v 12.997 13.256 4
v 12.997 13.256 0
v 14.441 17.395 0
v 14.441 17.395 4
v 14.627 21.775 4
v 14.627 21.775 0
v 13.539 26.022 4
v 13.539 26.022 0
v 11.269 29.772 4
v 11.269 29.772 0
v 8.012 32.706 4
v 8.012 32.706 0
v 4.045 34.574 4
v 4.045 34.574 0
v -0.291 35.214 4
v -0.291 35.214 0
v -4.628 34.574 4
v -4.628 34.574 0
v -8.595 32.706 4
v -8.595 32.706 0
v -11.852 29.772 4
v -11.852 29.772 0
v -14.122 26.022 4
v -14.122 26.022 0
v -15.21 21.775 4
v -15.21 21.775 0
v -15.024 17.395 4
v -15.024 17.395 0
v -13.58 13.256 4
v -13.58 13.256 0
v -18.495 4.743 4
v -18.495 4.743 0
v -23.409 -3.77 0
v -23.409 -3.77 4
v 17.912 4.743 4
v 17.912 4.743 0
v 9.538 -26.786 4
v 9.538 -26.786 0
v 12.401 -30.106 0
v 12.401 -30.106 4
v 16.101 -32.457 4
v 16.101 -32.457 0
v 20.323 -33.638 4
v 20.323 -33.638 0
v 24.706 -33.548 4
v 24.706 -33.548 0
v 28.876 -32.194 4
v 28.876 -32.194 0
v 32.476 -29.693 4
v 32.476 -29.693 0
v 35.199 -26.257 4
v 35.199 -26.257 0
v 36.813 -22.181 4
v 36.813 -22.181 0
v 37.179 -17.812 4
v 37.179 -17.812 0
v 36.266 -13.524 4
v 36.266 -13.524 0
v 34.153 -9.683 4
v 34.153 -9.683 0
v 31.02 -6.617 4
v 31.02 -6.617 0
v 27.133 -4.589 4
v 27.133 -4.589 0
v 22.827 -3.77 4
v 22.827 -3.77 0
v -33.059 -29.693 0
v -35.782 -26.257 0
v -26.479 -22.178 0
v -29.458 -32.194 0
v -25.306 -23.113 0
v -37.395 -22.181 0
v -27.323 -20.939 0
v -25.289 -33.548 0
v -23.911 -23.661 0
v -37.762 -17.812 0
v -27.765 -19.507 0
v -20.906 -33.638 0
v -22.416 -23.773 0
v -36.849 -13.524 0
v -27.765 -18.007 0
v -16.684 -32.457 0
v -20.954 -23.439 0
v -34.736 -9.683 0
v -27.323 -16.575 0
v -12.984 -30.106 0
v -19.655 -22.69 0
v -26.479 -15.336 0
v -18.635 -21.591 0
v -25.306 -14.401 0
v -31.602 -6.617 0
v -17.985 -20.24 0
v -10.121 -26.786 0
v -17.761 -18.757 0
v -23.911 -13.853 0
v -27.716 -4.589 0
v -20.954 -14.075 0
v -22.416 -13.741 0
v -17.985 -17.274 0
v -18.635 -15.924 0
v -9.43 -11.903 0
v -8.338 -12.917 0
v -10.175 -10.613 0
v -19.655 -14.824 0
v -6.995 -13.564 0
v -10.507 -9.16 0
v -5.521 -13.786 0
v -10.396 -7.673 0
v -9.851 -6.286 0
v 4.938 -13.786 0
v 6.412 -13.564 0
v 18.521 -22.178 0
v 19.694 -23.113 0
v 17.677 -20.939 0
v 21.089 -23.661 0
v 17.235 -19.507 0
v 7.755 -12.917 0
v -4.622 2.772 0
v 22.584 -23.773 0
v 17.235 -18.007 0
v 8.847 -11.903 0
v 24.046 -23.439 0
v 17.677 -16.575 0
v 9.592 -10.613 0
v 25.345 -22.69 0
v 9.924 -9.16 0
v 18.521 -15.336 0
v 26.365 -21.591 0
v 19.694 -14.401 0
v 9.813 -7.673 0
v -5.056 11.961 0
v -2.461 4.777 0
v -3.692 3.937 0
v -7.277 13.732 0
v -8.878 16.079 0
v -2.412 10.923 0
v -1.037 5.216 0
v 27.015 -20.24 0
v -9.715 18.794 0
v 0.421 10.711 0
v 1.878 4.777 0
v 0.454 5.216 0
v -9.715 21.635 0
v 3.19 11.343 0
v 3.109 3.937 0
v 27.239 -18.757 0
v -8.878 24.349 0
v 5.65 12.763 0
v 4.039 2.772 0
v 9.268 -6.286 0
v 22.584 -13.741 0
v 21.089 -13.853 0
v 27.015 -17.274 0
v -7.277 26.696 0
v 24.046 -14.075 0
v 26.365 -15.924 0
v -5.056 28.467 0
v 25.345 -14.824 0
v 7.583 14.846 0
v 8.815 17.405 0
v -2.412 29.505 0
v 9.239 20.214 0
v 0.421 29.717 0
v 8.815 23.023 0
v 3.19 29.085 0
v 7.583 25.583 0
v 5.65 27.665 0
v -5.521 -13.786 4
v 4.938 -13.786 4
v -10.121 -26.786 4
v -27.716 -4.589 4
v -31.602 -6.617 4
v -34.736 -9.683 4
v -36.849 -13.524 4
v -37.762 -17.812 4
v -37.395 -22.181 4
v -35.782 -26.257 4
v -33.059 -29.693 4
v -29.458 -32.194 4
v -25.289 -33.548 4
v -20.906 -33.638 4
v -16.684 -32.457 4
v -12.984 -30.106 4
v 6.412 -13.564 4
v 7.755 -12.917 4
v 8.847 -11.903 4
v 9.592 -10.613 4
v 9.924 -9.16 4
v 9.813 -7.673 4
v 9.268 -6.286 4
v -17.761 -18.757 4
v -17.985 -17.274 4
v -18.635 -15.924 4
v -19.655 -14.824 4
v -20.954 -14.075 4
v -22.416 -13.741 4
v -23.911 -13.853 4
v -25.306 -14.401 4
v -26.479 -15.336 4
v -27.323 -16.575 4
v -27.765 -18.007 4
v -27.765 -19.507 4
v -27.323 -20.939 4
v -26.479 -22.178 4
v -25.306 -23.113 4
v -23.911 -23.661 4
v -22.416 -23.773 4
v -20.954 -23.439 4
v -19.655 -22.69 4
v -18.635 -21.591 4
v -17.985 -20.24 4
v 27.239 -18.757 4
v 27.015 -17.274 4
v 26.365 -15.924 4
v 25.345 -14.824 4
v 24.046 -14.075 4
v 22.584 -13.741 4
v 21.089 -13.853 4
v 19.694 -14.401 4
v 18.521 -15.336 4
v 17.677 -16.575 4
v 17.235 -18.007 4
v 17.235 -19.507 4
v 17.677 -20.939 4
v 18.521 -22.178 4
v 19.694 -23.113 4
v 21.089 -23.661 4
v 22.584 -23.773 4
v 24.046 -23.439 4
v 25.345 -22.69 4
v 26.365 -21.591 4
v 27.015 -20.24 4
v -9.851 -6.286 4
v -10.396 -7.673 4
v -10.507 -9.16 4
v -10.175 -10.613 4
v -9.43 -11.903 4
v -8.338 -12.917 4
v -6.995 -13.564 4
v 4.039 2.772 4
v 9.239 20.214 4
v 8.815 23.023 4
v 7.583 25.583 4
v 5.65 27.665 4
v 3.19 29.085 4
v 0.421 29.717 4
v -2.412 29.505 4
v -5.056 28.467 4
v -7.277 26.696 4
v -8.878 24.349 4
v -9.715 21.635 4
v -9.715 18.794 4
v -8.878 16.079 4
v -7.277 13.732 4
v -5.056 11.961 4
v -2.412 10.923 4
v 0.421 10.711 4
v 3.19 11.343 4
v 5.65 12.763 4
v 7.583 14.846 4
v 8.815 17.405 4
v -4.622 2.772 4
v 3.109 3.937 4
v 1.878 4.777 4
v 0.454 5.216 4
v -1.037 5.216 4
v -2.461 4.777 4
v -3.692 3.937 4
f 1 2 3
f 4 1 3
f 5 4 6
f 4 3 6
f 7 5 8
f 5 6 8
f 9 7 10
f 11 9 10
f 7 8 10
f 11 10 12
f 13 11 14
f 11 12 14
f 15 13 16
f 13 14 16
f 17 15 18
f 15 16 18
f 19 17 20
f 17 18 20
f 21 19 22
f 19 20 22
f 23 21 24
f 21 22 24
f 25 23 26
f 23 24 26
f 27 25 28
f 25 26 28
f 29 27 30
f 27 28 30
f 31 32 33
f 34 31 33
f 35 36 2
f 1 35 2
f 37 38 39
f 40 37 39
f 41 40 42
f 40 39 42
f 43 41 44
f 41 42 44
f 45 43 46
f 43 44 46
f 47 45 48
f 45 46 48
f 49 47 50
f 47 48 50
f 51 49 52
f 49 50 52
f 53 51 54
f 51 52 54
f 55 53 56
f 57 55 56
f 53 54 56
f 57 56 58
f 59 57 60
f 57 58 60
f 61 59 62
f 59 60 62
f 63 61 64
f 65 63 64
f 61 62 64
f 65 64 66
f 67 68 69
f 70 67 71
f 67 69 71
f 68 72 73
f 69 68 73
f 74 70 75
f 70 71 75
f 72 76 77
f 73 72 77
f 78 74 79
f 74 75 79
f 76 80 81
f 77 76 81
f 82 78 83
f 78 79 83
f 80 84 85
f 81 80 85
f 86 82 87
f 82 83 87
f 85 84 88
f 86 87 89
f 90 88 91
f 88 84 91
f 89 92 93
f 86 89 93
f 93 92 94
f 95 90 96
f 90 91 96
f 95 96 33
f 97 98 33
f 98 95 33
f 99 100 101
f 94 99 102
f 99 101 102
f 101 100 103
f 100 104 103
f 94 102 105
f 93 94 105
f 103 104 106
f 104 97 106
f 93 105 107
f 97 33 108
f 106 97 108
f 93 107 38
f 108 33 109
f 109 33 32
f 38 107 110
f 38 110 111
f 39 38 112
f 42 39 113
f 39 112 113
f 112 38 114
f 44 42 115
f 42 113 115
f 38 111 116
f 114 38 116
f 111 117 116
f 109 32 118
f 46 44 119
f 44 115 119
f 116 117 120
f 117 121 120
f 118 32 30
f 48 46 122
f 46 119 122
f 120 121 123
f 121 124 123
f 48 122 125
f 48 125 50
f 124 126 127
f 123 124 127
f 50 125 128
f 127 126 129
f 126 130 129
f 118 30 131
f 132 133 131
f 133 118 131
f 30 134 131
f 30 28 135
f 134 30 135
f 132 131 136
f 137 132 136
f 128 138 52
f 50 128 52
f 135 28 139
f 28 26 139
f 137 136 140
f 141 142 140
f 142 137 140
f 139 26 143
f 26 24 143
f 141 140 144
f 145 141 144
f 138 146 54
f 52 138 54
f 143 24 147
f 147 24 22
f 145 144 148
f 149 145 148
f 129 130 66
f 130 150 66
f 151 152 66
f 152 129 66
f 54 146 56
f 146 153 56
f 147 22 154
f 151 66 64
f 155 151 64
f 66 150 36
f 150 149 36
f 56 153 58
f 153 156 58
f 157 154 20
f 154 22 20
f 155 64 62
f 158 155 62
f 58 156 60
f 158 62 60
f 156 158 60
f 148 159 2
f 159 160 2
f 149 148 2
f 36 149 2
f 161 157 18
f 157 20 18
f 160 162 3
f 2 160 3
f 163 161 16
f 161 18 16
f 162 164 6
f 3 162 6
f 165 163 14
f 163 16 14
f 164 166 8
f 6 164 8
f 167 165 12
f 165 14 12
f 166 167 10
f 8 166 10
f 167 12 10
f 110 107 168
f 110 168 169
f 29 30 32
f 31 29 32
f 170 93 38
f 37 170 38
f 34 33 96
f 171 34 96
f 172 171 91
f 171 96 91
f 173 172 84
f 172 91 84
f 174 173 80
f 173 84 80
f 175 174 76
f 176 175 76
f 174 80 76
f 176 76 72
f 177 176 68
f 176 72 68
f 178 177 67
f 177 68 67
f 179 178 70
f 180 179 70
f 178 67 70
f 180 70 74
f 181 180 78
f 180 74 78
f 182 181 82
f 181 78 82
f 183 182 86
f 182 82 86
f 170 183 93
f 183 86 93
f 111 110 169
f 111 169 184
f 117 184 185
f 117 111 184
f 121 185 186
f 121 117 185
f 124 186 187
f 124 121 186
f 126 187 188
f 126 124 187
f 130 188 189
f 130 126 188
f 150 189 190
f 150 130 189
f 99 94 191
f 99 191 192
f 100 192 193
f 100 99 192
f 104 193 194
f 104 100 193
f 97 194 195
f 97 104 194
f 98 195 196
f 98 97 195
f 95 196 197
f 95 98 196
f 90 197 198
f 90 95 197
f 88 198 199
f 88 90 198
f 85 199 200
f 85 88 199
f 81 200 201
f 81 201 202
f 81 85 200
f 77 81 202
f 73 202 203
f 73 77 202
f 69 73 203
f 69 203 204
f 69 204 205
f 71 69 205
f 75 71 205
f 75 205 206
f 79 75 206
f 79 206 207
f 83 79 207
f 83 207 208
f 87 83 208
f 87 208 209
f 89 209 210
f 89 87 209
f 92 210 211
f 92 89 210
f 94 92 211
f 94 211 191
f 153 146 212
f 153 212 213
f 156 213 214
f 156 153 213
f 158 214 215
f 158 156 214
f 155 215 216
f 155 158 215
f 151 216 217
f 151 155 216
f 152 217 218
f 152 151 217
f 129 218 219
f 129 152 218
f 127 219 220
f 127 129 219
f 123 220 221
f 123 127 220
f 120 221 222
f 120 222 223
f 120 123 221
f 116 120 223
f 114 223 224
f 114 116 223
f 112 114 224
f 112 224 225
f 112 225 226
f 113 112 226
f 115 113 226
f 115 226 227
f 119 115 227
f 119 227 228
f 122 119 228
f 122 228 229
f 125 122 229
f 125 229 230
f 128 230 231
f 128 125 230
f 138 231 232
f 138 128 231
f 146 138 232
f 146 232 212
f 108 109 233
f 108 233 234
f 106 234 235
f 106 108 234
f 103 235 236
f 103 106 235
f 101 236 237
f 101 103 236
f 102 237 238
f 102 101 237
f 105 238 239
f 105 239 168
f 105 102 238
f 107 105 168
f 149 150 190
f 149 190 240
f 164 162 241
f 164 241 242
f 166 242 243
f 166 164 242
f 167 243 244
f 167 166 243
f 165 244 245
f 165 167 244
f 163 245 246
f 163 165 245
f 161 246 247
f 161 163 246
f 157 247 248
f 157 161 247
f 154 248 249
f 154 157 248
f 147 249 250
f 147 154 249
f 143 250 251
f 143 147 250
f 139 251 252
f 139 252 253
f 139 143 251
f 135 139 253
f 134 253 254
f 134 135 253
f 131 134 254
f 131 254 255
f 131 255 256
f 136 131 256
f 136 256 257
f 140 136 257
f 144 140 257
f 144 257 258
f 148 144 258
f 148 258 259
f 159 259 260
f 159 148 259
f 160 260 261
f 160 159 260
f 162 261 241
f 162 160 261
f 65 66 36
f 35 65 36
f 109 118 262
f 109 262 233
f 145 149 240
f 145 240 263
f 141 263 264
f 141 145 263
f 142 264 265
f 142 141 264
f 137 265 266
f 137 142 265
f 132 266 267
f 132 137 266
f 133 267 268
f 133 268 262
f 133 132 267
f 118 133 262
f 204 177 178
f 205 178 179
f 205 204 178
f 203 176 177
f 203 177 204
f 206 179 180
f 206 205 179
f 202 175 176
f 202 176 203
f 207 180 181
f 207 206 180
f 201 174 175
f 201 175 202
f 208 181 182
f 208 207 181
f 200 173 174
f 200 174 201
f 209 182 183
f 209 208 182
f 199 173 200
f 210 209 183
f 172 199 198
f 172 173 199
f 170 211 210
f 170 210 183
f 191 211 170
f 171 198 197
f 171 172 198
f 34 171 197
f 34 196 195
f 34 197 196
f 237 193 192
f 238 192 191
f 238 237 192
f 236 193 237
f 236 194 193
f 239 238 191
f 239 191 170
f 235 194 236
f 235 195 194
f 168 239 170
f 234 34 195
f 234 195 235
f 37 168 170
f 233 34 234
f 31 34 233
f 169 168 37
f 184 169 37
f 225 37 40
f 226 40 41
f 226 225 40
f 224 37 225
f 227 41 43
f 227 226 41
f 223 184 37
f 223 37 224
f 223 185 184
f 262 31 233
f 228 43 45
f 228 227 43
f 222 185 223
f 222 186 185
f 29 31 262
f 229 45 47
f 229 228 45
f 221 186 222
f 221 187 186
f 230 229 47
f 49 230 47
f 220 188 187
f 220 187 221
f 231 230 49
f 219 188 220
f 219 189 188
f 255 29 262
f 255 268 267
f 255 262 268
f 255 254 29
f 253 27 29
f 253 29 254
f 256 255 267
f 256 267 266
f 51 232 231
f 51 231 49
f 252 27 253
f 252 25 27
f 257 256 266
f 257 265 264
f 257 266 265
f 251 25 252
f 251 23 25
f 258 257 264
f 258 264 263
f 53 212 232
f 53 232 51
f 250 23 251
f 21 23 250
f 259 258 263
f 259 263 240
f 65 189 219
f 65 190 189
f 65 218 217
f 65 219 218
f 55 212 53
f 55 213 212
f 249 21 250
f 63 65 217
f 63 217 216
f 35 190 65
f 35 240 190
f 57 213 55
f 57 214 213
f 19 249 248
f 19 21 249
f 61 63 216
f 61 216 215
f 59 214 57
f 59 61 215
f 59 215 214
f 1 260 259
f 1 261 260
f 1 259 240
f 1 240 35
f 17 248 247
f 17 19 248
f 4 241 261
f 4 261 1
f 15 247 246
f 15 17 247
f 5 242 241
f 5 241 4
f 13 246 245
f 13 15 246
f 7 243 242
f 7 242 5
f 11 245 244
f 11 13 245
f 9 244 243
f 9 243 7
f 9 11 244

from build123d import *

# Parameters (mm, degrees)
SKETCH_1_R      = 9.53
SKETCH_1_R_2    = 5.03
EXTRUDE_1_DEPTH = 4


with BuildPart() as part:
    # 草图1 → 凸台-拉伸1 (new body)
    with BuildSketch(Plane.XY):
        with BuildLine():
            Line((-18.494622549, 4.742999843), (-23.409453688, -3.769737399))
            ThreePointArc((-23.409453688, -3.769737399), (-35.781809628, -26.257000157), (-10.121090849, -26.785856986))
            Line((-10.121090849, -26.785856986), (-0.291428571, -26.785856986))
            Line((-0.291428571, -26.785856986), (9.538233706, -26.785856986))
            ThreePointArc((9.538233706, -26.785856986), (35.198952485, -26.257000157), (22.826596545, -3.769737399))
            Line((22.826596545, -3.769737399), (17.911765406, 4.742999843))
            Line((17.911765406, 4.742999843), (12.996934268, 13.255737086))
            ThreePointArc((12.996934268, 13.255737086), (-0.291428571, 35.214143014), (-13.579791411, 13.255737086))
            Line((-13.579791411, 13.255737086), (-18.494622549, 4.742999843))
        make_face()
        with Locations((-0.291428571, 20.214143014)):
            Circle(SKETCH_1_R, mode=Mode.SUBTRACT)
        with Locations((22.208571429, -18.757000157)):
            Circle(SKETCH_1_R_2, mode=Mode.SUBTRACT)
        with Locations((-22.791428571, -18.757000157)):
            Circle(SKETCH_1_R_2, mode=Mode.SUBTRACT)
        with BuildLine():
            Line((9.268171867, -6.285856986), (4.038698447, 2.771856673))
            ThreePointArc((4.038698447, 2.771856673), (-0.291428571, 5.271856673), (-4.62155559, 2.771856673))
            Line((-4.62155559, 2.771856673), (-9.85102901, -6.285856986))
            ThreePointArc((-9.85102901, -6.285856986), (-9.85102901, -11.285856986), (-5.520901991, -13.785856986))
            Line((-5.520901991, -13.785856986), (4.938044848, -13.785856986))
            ThreePointArc((4.938044848, -13.785856986), (9.268171867, -11.285856986), (9.268171867, -6.285856986))
        make_face(mode=Mode.SUBTRACT)
    extrude(amount=EXTRUDE_1_DEPTH)


solid = part.part
